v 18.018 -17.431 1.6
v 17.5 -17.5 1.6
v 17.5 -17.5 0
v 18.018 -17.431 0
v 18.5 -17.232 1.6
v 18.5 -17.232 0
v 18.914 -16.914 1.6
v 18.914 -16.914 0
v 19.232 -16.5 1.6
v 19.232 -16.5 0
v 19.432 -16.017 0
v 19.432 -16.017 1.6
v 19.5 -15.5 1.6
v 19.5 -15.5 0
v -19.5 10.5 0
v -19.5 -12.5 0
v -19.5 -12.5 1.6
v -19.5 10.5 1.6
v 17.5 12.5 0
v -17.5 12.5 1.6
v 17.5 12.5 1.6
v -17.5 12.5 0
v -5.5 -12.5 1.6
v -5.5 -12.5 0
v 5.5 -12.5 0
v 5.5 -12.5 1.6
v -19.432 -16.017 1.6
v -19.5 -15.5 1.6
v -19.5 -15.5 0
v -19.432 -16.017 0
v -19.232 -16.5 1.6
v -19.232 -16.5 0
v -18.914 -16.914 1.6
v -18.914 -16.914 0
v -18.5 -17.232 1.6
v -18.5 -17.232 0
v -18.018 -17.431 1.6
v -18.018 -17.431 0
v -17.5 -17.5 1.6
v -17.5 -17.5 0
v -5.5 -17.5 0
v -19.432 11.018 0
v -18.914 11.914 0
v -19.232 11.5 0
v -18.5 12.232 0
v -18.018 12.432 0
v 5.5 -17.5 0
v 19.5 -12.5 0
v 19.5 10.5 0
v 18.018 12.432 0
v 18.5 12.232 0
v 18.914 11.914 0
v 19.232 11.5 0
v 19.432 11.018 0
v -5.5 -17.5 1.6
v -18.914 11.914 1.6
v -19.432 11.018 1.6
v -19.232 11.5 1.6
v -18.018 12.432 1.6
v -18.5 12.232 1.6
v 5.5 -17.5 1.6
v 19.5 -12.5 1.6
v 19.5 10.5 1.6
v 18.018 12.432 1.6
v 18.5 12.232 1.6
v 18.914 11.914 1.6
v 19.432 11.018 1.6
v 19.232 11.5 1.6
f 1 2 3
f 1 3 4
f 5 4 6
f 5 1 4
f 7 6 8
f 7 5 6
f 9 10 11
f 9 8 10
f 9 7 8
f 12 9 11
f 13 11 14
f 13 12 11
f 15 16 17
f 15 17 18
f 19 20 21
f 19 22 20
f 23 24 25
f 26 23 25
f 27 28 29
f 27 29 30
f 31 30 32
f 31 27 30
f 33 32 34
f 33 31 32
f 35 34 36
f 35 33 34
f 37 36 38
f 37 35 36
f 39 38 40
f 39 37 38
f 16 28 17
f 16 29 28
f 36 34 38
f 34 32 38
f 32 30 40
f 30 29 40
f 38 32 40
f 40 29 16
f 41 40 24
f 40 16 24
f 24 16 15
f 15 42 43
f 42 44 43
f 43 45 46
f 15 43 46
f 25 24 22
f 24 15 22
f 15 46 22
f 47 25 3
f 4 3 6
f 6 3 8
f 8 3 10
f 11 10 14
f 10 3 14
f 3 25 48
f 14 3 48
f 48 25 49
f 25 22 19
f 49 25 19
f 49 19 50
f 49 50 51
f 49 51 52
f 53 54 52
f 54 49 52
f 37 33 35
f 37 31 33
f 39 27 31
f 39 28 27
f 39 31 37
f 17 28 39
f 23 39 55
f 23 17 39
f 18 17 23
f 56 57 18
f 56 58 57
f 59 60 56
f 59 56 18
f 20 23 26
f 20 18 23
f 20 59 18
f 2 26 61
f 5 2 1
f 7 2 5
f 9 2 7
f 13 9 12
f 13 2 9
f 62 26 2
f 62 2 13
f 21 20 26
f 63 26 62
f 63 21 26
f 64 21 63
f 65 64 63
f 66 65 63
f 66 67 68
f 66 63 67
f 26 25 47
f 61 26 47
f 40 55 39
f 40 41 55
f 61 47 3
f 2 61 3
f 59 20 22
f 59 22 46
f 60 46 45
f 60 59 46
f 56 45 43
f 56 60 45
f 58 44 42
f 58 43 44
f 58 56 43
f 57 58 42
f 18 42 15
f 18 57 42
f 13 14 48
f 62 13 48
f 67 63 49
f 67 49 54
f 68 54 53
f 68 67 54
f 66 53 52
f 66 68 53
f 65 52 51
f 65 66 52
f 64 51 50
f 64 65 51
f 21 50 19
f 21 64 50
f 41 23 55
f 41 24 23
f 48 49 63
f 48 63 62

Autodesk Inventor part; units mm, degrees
ref_plane "YZ Plane" through (0, 0, 0) normal (1, 0, 0) x (0, 1, 0)
ref_plane "XZ Plane" through (0, 0, 0) normal (0, 1, 0) x (-1, 0, 0)
ref_plane "XY Plane" through (0, 0, 0) normal (0, 0, 1) x (1, 0, 0)
sketch "Sketch2" plane through (0, 0, 0) normal (0, 0, 1) x (1, 0, 0)
  line L0 (-19.4999, -12.4999) -> (-19.4999, 12.4999)
  line L1 (-19.4999, 12.4999) -> (19.4999, 12.4999)
  line L2 (19.4999, 12.4999) -> (19.4999, -12.4999)
  line L3 (19.4999, -12.4999) -> (-19.4999, 12.4999) construction
  line L4 (-19.4999, -12.4999) -> (19.4999, 12.4999) construction
  line L5 (-5.4999, -12.4999) -> (-5.4999, -17.4996)
  line L6 (-5.4999, -17.4996) -> (-19.4999, -17.4996)
  line L7 (-19.4999, -17.4996) -> (-19.4999, -12.4999)
  line L8 (5.4995, -12.4999) -> (5.4995, -17.4996)
  line L9 (5.4995, -17.4996) -> (19.4999, -17.4996)
  line L10 (19.4999, -17.4996) -> (19.4999, -12.4999)
  line L11 (-5.4999, -12.4999) -> (5.4995, -12.4999)
  point P0 (0, 0)
extrude "Extrusion2" add sketch "Sketch2" along normal blind 1.6
fillet "Fillet3" radius 2 4 edges at (19.4999, 12.4999, 0.8) (-19.4999, 12.4999, 0.8) (19.4999, -17.4996, 0.8) (-19.4999, -17.4996, 0.8)
properties part number "pcb_balun_top"
